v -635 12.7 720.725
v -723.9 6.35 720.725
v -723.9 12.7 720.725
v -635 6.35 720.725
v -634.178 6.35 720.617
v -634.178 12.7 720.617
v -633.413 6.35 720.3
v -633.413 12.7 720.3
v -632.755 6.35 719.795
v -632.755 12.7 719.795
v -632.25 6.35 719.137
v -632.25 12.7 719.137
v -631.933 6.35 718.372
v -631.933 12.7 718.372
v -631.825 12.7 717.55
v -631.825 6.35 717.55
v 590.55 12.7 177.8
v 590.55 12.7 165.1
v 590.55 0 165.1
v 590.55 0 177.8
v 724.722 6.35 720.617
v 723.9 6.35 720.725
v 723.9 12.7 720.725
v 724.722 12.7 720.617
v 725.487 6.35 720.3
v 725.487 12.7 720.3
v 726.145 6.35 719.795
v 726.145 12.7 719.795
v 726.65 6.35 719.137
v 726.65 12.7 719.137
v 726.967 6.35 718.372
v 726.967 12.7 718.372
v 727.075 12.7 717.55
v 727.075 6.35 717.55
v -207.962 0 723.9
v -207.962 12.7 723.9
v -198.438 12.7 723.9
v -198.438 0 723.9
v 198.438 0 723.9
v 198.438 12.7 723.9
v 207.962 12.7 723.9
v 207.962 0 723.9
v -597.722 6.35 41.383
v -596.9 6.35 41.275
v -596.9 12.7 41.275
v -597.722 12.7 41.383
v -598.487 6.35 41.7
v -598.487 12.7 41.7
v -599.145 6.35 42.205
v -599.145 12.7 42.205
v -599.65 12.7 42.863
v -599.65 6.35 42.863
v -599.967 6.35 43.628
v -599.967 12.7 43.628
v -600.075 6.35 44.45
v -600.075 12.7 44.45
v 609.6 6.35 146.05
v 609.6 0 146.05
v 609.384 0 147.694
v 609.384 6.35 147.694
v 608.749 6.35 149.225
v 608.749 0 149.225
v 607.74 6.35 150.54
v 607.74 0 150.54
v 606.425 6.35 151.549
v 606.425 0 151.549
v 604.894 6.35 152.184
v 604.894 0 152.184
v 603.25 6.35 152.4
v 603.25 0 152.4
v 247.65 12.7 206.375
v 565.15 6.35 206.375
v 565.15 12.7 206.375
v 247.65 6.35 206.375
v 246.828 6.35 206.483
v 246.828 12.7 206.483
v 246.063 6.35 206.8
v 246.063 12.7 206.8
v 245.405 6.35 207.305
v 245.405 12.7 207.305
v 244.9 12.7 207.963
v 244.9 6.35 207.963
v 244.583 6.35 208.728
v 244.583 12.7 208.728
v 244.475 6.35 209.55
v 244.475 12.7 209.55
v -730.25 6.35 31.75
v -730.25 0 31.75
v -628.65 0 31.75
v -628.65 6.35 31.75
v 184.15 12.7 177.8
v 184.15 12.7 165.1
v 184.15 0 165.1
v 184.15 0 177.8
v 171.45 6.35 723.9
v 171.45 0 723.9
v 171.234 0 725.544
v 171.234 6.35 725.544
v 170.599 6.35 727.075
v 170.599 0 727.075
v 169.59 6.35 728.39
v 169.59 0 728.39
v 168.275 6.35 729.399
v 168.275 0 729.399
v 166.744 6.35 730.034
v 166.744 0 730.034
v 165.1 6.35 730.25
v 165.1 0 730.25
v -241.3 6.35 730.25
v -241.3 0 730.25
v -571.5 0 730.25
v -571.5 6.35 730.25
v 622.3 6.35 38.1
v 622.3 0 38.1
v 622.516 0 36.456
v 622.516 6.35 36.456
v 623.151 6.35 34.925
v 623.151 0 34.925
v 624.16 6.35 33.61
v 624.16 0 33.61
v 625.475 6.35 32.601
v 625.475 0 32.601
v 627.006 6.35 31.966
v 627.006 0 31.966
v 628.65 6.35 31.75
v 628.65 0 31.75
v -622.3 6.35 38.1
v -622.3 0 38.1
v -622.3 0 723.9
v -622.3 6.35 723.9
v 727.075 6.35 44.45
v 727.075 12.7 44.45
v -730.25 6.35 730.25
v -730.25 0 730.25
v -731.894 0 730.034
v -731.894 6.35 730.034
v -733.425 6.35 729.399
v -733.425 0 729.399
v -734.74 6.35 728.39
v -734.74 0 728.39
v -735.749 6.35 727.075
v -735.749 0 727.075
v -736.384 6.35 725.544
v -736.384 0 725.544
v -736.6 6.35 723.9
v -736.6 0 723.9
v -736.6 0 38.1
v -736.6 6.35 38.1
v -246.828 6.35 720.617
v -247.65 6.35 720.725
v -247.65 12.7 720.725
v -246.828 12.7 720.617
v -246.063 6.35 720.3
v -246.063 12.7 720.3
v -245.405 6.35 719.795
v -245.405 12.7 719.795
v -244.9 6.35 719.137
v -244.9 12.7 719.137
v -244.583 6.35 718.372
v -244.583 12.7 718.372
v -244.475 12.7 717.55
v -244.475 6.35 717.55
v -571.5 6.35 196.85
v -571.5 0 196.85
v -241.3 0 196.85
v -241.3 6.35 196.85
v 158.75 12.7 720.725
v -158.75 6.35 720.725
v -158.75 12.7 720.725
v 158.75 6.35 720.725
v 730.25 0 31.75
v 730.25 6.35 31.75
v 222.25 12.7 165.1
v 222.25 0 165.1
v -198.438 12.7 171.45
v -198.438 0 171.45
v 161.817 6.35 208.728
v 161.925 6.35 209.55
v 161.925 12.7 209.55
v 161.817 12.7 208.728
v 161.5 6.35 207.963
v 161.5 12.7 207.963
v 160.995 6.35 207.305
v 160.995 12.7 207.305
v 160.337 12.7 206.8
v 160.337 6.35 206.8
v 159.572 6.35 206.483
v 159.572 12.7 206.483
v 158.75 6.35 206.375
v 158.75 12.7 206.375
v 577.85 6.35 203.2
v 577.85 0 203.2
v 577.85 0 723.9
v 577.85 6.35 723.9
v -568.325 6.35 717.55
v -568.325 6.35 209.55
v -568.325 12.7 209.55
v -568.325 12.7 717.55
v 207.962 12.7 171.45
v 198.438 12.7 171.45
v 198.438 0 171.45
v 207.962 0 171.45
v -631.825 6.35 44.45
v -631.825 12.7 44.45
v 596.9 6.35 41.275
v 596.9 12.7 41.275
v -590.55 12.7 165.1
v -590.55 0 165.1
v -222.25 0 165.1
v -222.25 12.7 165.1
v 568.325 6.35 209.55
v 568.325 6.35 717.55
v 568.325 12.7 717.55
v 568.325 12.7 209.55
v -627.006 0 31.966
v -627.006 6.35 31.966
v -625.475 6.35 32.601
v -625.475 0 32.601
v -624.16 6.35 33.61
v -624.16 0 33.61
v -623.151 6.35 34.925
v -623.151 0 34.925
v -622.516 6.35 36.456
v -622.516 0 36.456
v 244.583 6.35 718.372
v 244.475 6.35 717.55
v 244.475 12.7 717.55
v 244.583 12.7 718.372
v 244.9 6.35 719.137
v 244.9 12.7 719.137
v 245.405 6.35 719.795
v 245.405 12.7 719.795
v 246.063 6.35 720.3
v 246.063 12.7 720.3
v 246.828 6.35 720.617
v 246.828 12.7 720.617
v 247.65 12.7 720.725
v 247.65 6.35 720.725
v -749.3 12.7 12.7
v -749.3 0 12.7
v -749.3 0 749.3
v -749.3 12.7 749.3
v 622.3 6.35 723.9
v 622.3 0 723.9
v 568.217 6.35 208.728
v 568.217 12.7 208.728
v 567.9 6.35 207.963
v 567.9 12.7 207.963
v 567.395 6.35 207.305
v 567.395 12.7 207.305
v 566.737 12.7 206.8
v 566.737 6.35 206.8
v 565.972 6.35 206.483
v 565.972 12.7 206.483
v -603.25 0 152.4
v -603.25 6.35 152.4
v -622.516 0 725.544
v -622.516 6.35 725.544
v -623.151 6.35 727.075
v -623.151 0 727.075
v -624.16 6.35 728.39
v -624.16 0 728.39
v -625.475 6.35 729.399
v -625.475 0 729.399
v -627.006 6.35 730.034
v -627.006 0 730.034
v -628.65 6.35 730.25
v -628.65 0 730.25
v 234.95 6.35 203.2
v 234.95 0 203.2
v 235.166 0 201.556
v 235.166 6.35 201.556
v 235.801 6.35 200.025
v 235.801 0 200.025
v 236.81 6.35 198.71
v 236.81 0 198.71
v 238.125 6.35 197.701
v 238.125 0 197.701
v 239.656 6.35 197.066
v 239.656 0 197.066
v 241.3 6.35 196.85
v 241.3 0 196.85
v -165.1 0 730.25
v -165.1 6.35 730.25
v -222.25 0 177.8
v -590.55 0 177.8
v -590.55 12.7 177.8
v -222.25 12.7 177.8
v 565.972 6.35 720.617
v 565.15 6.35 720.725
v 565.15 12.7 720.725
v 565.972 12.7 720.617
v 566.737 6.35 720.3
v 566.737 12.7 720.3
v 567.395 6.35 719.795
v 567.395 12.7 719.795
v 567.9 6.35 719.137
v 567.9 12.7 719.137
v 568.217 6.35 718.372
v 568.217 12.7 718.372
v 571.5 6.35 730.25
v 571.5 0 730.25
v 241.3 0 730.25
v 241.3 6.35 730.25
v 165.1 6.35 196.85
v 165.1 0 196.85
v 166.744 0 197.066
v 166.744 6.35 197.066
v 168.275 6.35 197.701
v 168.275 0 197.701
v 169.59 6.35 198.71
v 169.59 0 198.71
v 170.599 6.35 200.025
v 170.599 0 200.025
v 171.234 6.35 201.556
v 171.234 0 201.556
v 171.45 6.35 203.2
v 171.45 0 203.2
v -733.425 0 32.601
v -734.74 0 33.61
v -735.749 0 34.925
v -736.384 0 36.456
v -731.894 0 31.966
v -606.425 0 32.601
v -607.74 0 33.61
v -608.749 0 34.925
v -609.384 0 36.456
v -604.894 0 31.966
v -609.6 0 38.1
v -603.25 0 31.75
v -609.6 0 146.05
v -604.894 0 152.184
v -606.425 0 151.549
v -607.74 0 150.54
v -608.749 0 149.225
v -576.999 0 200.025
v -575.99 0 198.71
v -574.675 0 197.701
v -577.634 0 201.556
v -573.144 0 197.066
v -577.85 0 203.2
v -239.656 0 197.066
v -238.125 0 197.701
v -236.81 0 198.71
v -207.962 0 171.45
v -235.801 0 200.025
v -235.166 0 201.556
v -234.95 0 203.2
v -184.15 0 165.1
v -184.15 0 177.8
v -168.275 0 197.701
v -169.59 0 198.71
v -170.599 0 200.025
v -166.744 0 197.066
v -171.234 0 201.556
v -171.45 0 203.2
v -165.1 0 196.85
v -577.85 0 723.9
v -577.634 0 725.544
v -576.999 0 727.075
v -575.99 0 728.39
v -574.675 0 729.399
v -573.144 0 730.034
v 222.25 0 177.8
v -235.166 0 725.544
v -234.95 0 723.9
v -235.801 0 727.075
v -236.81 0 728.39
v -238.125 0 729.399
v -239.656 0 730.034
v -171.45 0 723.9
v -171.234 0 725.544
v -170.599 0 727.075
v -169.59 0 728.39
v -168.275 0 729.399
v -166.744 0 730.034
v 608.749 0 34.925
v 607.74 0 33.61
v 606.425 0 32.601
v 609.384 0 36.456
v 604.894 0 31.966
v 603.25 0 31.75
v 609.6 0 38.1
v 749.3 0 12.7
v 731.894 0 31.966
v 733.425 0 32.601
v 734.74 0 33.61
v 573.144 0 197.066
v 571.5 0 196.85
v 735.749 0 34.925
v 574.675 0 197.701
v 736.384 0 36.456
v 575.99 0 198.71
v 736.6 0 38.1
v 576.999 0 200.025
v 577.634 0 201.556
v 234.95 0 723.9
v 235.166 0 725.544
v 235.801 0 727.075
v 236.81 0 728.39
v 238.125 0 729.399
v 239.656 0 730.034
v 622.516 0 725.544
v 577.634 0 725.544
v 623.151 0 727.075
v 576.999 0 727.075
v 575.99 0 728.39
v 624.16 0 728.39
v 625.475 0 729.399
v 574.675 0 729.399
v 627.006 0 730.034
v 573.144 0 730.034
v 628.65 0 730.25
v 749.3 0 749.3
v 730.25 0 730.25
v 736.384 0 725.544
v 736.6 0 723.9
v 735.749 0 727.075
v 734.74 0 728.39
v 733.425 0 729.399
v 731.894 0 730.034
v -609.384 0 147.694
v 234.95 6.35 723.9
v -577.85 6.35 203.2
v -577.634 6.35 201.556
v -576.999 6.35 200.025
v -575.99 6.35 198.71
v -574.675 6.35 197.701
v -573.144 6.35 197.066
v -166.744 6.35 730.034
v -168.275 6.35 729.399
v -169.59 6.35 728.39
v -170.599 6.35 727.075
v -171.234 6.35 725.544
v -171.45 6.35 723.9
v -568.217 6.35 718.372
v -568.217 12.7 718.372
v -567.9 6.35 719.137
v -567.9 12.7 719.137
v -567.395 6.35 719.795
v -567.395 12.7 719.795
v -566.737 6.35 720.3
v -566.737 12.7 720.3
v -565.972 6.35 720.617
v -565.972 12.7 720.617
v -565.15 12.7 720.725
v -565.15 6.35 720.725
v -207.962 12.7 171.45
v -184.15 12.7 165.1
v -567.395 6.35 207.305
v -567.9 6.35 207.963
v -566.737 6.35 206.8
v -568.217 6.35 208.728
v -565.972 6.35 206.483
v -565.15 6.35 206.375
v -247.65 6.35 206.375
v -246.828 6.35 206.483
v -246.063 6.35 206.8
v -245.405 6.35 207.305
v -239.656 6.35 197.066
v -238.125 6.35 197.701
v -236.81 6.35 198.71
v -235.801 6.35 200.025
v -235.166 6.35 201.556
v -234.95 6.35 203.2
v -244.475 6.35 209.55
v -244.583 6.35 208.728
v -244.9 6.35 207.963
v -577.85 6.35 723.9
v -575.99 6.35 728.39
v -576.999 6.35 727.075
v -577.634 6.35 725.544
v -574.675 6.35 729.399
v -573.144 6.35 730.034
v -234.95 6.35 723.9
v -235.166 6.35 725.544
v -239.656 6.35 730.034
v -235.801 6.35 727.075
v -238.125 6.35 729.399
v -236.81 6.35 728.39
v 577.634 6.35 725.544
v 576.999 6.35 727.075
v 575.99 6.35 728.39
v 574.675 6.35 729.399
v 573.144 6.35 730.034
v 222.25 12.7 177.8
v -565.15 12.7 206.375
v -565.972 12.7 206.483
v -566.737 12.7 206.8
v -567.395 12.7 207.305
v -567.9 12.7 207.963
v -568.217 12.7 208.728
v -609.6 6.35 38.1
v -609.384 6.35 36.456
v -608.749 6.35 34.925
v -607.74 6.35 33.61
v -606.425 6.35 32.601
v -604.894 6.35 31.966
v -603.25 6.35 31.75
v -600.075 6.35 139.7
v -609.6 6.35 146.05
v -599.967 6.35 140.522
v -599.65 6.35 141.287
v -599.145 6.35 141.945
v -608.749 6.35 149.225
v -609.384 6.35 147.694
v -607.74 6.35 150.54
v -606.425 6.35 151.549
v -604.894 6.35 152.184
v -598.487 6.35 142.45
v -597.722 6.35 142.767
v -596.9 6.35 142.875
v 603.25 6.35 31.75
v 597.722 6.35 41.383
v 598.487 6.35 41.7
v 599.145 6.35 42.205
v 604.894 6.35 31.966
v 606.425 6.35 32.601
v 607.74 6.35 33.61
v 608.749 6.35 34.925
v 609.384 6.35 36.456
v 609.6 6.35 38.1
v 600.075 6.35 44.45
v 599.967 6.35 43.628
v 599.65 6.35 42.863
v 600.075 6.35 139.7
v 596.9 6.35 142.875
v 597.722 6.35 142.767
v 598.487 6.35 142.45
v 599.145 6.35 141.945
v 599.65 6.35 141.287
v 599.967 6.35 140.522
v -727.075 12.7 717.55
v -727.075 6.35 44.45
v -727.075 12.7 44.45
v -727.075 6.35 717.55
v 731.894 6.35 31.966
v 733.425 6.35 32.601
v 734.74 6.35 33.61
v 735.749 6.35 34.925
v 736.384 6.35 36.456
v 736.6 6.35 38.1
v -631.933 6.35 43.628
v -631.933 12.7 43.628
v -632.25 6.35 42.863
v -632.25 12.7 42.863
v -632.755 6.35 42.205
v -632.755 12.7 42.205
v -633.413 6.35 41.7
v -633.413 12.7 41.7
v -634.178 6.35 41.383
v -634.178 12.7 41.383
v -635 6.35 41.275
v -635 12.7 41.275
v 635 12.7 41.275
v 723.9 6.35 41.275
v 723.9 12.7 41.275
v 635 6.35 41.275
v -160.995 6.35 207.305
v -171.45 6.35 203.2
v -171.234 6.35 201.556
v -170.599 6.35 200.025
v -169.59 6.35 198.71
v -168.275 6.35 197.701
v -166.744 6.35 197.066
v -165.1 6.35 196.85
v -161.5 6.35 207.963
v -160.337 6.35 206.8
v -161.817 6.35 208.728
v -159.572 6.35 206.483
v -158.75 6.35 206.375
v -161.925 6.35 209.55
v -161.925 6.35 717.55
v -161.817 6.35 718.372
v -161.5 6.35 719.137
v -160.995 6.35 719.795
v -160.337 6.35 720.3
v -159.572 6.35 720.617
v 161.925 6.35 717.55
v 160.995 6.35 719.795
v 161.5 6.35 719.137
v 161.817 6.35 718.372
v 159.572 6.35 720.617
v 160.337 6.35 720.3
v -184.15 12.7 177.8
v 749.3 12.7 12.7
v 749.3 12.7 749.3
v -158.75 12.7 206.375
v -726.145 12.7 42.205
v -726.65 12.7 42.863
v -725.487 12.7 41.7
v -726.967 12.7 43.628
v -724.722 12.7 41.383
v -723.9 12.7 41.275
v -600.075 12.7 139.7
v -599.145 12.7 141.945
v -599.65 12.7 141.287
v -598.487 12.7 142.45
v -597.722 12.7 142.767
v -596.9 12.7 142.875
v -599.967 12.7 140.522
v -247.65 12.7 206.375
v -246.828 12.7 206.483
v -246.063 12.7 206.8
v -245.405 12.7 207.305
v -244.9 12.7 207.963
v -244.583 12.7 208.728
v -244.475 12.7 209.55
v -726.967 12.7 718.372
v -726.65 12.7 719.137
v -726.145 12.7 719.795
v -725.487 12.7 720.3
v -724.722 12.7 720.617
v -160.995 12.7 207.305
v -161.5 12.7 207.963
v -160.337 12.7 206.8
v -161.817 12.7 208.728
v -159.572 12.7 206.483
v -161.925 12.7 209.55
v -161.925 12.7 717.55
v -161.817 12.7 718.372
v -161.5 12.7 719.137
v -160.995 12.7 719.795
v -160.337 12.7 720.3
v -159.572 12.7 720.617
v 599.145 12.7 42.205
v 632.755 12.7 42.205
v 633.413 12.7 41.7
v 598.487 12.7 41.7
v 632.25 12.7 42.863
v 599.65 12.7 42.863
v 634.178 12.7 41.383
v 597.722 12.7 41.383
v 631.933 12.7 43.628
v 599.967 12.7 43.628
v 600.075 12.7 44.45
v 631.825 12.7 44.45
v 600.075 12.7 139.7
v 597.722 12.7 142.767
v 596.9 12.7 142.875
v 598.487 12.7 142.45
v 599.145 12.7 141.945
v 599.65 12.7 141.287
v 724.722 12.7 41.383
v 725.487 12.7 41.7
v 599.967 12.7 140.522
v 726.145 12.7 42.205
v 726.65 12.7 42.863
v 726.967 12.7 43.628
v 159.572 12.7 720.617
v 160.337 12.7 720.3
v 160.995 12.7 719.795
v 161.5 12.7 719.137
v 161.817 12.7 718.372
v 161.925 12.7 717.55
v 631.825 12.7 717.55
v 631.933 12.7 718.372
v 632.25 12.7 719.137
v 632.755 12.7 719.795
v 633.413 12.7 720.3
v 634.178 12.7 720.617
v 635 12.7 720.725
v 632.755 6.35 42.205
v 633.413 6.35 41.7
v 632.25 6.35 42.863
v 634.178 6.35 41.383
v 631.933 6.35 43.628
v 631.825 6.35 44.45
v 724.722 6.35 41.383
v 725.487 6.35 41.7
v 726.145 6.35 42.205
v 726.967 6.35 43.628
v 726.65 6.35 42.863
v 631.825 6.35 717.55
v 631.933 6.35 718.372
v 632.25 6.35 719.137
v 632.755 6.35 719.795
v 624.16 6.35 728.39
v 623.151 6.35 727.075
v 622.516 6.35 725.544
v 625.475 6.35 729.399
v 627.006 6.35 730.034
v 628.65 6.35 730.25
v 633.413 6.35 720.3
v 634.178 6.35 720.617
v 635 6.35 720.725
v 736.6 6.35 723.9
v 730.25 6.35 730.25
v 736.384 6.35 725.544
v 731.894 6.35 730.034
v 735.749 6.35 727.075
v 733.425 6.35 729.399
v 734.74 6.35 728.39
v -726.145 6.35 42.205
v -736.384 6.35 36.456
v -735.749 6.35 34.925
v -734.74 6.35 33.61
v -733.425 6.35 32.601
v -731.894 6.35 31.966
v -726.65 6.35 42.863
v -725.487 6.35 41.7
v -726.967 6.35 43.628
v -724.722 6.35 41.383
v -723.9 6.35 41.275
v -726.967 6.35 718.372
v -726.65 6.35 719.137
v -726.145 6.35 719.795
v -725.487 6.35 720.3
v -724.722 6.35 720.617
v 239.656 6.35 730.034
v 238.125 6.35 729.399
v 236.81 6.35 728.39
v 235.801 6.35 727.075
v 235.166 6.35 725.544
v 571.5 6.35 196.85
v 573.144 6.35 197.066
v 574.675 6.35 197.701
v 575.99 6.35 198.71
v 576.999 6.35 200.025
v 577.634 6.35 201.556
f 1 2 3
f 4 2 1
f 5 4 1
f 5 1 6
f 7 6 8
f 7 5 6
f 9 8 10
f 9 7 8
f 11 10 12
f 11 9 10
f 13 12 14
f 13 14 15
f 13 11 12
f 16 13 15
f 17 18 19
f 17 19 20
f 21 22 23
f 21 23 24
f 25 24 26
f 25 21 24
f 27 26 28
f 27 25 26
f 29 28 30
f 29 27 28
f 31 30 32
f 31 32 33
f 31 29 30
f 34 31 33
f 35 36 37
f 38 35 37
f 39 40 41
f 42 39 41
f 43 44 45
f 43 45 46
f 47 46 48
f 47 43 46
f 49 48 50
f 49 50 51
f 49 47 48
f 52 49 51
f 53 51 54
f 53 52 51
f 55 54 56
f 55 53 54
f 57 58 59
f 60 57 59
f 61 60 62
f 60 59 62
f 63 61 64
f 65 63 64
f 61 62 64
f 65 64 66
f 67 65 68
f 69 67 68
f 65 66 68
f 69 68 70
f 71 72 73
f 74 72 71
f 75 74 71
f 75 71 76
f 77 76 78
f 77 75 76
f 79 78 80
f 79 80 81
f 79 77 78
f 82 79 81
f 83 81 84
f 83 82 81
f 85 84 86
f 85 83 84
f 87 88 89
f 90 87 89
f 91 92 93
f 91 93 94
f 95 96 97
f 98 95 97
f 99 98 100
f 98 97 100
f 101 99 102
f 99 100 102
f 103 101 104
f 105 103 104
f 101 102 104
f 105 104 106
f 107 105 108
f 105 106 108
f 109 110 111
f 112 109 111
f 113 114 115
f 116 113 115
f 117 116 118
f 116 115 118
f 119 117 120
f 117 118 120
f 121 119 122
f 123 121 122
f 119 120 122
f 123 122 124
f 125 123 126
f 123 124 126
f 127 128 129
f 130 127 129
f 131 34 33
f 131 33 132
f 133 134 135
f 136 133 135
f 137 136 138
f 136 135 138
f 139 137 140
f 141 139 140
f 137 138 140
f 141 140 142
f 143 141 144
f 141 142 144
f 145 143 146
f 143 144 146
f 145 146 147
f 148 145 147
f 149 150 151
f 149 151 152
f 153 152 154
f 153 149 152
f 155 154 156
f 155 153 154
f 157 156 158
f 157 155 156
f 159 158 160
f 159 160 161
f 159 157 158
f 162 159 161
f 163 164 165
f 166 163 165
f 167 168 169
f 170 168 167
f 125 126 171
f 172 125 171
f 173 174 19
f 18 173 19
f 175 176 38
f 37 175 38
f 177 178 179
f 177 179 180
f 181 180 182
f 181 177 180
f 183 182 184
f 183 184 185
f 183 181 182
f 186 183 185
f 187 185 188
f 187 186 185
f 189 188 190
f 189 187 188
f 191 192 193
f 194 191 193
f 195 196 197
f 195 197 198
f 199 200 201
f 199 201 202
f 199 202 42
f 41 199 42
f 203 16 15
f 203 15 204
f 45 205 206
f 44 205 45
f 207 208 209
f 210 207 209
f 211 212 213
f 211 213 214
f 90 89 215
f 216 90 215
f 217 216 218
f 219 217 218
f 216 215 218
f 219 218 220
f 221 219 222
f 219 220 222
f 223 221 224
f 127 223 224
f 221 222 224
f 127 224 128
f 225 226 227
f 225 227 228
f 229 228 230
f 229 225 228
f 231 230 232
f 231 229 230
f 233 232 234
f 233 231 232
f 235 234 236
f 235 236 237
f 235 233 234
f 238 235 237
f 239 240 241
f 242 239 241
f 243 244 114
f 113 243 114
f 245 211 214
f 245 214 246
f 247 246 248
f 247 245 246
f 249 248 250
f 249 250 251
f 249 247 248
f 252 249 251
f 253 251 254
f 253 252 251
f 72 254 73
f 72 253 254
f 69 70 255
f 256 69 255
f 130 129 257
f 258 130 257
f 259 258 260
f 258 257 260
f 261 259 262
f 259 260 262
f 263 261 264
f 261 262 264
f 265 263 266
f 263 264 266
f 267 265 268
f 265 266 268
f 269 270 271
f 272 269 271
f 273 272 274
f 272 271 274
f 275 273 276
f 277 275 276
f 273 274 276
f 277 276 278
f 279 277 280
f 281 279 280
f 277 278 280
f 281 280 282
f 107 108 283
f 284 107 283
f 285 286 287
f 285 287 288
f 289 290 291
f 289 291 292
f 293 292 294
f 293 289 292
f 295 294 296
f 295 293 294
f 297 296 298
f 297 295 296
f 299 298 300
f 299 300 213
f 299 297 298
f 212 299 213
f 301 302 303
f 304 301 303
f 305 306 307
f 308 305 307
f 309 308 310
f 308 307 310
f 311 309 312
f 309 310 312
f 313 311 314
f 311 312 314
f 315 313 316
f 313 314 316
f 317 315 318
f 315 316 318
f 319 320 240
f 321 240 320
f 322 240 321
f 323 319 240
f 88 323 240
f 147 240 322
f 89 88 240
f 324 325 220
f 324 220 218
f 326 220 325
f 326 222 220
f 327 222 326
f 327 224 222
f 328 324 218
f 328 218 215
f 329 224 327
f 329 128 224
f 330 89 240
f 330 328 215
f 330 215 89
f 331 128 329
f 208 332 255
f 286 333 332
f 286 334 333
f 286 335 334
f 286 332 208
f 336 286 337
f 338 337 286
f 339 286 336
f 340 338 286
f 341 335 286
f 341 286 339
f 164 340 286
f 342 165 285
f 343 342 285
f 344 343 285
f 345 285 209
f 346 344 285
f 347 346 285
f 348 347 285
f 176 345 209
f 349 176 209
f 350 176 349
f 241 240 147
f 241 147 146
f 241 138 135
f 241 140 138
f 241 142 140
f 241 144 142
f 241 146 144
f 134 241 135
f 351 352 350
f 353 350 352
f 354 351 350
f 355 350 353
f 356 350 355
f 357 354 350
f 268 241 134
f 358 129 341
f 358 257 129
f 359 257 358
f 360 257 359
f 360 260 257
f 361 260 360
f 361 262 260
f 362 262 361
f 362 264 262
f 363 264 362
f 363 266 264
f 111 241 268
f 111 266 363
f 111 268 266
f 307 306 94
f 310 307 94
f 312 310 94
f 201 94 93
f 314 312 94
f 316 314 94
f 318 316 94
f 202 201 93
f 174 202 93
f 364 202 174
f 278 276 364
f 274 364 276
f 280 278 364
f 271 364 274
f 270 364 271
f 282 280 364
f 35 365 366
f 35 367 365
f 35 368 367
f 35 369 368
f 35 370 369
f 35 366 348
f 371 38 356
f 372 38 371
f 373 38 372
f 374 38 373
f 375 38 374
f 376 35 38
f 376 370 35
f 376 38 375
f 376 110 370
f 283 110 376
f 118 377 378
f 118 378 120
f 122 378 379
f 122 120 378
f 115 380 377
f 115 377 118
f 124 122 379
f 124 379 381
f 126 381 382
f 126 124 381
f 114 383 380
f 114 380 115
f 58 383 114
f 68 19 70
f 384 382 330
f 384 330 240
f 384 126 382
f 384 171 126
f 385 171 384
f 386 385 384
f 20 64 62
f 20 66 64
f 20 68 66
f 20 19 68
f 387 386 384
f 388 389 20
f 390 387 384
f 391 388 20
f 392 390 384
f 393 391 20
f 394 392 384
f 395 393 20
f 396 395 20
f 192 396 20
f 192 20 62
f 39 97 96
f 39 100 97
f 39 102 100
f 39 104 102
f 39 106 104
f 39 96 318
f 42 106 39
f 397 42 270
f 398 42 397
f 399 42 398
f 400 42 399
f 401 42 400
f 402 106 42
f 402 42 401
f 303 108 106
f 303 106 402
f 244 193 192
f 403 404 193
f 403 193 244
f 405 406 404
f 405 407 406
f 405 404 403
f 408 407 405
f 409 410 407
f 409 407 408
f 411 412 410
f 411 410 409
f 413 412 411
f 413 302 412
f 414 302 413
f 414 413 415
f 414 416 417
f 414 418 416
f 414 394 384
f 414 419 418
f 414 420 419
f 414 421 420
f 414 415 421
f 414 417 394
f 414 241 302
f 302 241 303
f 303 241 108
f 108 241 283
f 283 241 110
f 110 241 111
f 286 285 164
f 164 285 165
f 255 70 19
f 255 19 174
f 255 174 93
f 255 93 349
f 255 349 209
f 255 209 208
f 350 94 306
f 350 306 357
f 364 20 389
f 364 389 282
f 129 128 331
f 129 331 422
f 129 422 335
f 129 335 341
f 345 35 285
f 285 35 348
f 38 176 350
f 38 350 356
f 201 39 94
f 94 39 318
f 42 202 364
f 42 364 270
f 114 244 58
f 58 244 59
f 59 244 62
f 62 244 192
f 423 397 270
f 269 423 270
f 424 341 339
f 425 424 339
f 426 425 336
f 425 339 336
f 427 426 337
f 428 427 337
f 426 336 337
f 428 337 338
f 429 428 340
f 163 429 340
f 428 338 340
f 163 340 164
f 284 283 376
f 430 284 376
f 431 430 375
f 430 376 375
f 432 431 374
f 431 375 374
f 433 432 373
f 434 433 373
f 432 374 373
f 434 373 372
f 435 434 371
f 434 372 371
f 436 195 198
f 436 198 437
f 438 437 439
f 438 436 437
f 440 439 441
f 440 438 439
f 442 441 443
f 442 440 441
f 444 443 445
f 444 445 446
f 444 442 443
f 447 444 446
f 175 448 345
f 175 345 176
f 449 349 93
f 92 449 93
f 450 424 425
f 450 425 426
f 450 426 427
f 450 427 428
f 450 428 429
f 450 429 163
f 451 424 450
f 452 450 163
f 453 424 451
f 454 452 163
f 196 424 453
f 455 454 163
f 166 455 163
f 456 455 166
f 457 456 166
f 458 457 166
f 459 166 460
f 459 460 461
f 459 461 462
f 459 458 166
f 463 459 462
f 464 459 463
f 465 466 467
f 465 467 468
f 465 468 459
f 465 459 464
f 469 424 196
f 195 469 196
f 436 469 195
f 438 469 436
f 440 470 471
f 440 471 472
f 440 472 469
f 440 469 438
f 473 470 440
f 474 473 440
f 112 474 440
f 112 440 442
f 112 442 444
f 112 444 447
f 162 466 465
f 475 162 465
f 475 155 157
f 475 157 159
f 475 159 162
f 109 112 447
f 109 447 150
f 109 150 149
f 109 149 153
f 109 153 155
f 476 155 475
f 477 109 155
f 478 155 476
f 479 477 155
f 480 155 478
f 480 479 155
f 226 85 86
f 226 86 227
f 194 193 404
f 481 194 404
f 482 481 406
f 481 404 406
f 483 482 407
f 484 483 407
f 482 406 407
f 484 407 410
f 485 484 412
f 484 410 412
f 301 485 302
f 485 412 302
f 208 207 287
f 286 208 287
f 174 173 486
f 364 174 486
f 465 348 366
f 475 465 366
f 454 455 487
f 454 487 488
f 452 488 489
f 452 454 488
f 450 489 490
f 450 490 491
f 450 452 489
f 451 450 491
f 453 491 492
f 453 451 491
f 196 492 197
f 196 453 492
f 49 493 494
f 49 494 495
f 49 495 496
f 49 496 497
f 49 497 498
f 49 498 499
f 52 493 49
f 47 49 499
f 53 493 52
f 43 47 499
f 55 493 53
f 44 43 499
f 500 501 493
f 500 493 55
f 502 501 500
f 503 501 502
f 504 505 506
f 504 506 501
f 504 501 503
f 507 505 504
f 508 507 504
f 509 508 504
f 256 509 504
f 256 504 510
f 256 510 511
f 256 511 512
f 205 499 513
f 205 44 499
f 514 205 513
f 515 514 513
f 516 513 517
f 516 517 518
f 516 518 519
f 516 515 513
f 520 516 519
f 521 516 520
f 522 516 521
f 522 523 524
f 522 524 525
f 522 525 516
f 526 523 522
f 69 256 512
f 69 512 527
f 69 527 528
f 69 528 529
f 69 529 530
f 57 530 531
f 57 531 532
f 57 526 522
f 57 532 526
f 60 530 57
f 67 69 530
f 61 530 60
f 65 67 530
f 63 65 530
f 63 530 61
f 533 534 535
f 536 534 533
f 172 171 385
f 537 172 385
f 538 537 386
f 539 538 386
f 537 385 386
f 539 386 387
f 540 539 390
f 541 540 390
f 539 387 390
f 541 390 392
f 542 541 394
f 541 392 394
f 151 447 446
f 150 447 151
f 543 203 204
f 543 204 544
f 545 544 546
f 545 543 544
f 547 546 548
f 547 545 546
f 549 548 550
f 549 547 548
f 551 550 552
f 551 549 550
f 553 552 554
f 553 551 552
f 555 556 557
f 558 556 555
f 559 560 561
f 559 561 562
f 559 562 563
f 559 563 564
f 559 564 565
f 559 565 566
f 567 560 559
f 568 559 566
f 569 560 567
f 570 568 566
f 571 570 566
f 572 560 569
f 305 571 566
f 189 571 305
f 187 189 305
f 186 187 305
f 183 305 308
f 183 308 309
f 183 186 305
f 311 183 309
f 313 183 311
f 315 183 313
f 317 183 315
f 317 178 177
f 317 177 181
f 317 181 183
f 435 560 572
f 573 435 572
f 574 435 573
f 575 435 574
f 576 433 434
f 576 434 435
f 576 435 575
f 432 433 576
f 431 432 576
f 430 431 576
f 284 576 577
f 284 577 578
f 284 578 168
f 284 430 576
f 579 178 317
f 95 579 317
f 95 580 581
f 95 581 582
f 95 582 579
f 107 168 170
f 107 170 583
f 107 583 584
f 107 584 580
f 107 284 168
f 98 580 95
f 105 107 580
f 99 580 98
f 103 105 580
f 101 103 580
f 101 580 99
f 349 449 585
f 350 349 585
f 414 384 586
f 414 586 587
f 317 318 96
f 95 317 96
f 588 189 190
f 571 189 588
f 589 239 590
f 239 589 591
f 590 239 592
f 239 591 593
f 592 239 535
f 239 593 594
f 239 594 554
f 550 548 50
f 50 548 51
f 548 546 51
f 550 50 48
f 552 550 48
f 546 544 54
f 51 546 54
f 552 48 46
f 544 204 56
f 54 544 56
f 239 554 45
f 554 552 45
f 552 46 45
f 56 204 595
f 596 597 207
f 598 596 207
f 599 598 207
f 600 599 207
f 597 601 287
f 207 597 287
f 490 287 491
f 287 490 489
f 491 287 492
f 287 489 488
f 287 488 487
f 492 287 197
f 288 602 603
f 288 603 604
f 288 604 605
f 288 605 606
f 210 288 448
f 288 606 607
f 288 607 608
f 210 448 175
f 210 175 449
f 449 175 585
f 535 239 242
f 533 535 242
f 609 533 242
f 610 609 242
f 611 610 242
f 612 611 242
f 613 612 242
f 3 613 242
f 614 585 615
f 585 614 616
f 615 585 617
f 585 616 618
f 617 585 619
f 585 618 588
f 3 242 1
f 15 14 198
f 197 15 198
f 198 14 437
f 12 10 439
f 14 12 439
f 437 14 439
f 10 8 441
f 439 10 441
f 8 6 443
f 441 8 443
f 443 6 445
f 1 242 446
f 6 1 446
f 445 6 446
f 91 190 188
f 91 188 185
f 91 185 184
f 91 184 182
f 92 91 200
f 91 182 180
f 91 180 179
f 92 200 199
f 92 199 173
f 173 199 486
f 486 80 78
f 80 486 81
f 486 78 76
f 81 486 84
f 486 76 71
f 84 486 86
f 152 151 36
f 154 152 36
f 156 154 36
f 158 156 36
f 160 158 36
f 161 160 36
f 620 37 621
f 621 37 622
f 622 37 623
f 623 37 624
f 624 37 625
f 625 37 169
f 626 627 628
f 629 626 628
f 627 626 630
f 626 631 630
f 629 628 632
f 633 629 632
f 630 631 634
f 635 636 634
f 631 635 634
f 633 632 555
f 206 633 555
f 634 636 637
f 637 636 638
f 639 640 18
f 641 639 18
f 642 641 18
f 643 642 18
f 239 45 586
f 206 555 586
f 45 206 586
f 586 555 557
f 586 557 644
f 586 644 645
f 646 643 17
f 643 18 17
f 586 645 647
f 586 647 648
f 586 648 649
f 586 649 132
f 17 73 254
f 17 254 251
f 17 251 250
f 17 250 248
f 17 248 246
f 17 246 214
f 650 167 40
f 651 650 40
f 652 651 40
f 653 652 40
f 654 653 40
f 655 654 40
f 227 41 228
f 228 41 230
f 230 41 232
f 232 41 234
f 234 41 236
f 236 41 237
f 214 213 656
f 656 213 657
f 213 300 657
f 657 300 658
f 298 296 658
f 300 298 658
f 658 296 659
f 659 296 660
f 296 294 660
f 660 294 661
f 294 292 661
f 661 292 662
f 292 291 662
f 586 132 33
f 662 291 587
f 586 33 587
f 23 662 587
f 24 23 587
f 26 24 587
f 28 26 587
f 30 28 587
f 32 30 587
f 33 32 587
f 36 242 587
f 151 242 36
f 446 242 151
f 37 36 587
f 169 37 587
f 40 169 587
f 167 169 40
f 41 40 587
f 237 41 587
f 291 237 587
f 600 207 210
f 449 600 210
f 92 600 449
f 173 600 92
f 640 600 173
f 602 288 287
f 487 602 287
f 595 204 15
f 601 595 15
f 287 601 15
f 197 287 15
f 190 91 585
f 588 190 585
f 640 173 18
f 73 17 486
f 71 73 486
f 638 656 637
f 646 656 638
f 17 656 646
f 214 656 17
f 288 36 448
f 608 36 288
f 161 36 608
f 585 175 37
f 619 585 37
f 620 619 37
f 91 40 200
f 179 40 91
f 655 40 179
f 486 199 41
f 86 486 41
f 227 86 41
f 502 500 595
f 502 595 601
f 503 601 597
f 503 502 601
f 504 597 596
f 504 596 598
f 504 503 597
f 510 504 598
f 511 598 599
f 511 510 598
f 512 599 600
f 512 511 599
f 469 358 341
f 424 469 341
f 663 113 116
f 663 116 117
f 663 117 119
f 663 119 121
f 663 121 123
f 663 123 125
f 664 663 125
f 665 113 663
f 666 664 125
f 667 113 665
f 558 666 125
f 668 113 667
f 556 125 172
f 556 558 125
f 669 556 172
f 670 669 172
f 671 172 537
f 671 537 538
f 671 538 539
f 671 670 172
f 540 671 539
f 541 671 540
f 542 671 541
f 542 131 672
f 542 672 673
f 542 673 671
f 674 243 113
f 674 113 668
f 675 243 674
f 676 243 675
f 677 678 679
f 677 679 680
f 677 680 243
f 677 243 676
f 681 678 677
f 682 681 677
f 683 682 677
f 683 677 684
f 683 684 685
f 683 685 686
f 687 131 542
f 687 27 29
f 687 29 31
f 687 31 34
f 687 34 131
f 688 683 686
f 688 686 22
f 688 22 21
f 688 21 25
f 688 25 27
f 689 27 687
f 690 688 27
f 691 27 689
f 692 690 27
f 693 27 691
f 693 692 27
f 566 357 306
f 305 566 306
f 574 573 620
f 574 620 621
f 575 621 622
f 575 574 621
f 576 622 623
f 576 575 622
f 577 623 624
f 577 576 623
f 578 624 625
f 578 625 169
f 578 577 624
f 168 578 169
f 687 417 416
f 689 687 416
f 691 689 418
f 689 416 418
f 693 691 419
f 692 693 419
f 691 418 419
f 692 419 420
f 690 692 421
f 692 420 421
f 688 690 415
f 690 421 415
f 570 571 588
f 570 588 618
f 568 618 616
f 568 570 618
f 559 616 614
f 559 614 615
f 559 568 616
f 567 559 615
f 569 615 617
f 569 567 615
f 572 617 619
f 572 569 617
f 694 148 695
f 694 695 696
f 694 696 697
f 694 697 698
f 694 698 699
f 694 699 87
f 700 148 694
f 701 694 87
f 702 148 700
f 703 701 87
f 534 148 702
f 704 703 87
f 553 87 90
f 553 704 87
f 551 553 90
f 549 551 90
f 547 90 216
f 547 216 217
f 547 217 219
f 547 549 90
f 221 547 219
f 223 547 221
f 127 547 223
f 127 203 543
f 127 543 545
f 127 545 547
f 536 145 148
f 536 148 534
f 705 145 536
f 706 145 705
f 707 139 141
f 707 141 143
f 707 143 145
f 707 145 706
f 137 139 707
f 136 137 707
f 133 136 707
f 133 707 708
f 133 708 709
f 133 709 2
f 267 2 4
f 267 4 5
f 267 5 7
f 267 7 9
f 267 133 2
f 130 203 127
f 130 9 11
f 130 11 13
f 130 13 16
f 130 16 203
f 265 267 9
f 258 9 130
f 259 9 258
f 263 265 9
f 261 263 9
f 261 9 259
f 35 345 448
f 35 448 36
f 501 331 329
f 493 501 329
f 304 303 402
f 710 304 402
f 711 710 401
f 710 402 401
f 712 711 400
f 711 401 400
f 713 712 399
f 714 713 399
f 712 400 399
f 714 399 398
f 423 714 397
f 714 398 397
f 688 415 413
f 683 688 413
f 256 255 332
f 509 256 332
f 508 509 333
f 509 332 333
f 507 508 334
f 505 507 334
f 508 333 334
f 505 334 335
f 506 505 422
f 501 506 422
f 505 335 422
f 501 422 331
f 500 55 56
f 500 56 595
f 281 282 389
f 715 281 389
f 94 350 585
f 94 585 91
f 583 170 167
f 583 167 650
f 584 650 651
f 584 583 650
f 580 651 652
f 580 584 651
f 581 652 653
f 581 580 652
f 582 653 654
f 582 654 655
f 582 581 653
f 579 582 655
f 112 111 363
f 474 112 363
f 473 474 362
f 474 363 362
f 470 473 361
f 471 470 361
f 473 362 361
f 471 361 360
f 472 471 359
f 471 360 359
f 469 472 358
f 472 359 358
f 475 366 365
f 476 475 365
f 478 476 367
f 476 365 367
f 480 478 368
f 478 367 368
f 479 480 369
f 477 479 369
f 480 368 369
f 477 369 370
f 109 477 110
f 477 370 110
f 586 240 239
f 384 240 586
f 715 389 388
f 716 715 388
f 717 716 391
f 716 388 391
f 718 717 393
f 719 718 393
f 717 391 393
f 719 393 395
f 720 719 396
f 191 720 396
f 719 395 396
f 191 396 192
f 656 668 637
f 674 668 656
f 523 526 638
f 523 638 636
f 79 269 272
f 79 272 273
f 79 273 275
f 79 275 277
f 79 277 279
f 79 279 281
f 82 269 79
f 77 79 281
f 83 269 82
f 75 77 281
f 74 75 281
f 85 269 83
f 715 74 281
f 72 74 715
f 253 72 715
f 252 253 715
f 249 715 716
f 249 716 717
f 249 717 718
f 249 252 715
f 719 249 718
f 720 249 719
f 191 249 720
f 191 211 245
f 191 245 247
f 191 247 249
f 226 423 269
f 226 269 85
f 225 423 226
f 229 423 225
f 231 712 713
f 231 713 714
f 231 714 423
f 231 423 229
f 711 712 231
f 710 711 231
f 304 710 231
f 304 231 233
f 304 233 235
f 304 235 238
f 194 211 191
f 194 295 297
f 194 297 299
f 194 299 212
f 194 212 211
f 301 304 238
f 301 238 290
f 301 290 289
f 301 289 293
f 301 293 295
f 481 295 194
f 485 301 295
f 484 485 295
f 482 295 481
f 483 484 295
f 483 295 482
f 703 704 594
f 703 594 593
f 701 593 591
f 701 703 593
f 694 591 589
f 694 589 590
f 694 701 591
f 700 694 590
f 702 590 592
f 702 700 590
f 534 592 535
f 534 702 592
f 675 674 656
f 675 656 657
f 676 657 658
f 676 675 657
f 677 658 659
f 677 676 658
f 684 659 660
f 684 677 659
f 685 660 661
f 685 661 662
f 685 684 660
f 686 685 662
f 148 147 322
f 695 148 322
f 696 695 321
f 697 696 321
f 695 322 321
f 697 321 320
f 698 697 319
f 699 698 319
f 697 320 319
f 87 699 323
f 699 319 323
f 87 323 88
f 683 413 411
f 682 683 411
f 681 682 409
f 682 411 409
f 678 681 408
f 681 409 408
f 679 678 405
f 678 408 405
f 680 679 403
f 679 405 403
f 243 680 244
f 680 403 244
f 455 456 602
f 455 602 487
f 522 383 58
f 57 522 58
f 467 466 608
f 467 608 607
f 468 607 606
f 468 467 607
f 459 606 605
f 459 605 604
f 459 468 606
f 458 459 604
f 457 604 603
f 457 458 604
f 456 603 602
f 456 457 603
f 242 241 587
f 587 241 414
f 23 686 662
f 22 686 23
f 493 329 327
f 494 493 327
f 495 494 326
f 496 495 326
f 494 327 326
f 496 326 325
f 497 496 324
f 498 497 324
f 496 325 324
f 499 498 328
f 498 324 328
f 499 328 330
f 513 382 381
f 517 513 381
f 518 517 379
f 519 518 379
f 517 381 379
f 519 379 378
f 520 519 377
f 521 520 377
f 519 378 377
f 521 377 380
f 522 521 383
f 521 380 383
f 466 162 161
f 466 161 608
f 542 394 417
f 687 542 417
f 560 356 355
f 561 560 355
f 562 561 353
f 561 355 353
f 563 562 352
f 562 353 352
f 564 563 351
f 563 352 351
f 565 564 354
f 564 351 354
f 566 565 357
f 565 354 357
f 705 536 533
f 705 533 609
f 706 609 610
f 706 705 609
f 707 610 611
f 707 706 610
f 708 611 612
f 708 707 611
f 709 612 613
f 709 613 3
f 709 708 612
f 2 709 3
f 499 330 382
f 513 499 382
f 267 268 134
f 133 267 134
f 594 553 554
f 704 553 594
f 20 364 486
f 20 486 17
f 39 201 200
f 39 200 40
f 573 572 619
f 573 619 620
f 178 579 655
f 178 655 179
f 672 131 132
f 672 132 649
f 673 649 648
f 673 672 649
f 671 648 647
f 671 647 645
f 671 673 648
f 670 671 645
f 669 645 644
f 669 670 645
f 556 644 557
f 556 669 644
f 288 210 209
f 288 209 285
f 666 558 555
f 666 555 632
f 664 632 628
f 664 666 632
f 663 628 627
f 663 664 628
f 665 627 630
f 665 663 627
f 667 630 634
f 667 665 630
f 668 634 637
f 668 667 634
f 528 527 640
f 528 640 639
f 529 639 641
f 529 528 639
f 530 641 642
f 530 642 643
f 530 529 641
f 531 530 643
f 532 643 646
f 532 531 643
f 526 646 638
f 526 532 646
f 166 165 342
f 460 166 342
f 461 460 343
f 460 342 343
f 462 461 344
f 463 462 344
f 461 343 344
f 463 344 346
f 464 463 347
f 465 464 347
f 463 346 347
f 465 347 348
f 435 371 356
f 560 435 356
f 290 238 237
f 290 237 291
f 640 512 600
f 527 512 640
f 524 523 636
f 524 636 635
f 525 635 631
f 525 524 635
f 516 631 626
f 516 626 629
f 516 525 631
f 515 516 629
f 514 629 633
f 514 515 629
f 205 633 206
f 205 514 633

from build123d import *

# Parameters (mm, degrees)
F0_W     = 1498.6
F0_H     = 736.6
F0_W_2   = 368.3
F0_H_2   = 12.7
F0_W_3   = 9.525
F0_H_3   = 552.45
F1_DEPTH = 12.7
F2_DEPTH = 6.35


with BuildPart() as f1:
    # F0 (on Front) → F1 (new body)
    with BuildSketch(Plane.XZ):
        with Locations((0, 381)):
            Rectangle(F0_W, F0_H)
        with Locations((-406.4, 171.45)):
            Rectangle(F0_W_2, F0_H_2, mode=Mode.SUBTRACT)
        with BuildLine():
            Line((-609.6, 38.1), (-609.6, 146.05))
            ThreePointArc((-609.6, 146.05), (-607.740128, 150.540128), (-603.25, 152.4))
            Line((-603.25, 152.4), (603.25, 152.4))
            ThreePointArc((603.25, 152.4), (607.740128, 150.540128), (609.6, 146.05))
            Line((609.6, 146.05), (609.6, 38.1))
            ThreePointArc((609.6, 38.1), (607.740128, 33.609872), (603.25, 31.75))
            Line((603.25, 31.75), (-603.25, 31.75))
            ThreePointArc((-603.25, 31.75), (-607.740128, 33.609872), (-609.6, 38.1))
        make_face(mode=Mode.SUBTRACT)
        with Locations((0, 171.45)):
            Rectangle(F0_W_2, F0_H_2, mode=Mode.SUBTRACT)
        with Locations((406.4, 171.45)):
            Rectangle(F0_W_2, F0_H_2, mode=Mode.SUBTRACT)
        with BuildLine():
            ThreePointArc((-628.65, 730.25), (-624.159872, 728.390128), (-622.3, 723.9))
            Line((-622.3, 723.9), (-622.3, 38.1))
            ThreePointArc((-622.3, 38.1), (-624.159872, 33.609872), (-628.65, 31.75))
            Line((-628.65, 31.75), (-730.25, 31.75))
            ThreePointArc((-730.25, 31.75), (-734.740128, 33.609872), (-736.6, 38.1))
            Line((-736.6, 38.1), (-736.6, 723.9))
            ThreePointArc((-736.6, 723.9), (-734.740128, 728.390128), (-730.25, 730.25))
            Line((-730.25, 730.25), (-628.65, 730.25))
        make_face(mode=Mode.SUBTRACT)
        with BuildLine():
            Line((-577.85, 203.2), (-577.85, 723.9))
            ThreePointArc((-577.85, 723.9), (-575.990128, 728.390128), (-571.5, 730.25))
            Line((-571.5, 730.25), (-241.3, 730.25))
            ThreePointArc((-241.3, 730.25), (-236.809872, 728.390128), (-234.95, 723.9))
            Line((-234.95, 723.9), (-234.95, 203.2))
            ThreePointArc((-234.95, 203.2), (-236.809872, 198.709872), (-241.3, 196.85))
            Line((-241.3, 196.85), (-571.5, 196.85))
            ThreePointArc((-571.5, 196.85), (-575.990128, 198.709872), (-577.85, 203.2))
        make_face(mode=Mode.SUBTRACT)
        with Locations((-203.2, 447.675)):
            Rectangle(F0_W_3, F0_H_3, mode=Mode.SUBTRACT)
        with BuildLine():
            Line((-171.45, 203.2), (-171.45, 723.9))
            ThreePointArc((-171.45, 723.9), (-169.590128, 728.390128), (-165.1, 730.25))
            Line((-165.1, 730.25), (165.1, 730.25))
            ThreePointArc((165.1, 730.25), (169.590128, 728.390128), (171.45, 723.9))
            Line((171.45, 723.9), (171.45, 203.2))
            ThreePointArc((171.45, 203.2), (169.590128, 198.709872), (165.1, 196.85))
            Line((165.1, 196.85), (-165.1, 196.85))
            ThreePointArc((-165.1, 196.85), (-169.590128, 198.709872), (-171.45, 203.2))
        make_face(mode=Mode.SUBTRACT)
        with Locations((203.2, 447.675)):
            Rectangle(F0_W_3, F0_H_3, mode=Mode.SUBTRACT)
        with BuildLine():
            Line((234.95, 203.2), (234.95, 723.9))
            ThreePointArc((234.95, 723.9), (236.809872, 728.390128), (241.3, 730.25))
            Line((241.3, 730.25), (571.5, 730.25))
            ThreePointArc((571.5, 730.25), (575.990128, 728.390128), (577.85, 723.9))
            Line((577.85, 723.9), (577.85, 203.2))
            ThreePointArc((577.85, 203.2), (575.990128, 198.709872), (571.5, 196.85))
            Line((571.5, 196.85), (241.3, 196.85))
            ThreePointArc((241.3, 196.85), (236.809872, 198.709872), (234.95, 203.2))
        make_face(mode=Mode.SUBTRACT)
        with BuildLine():
            Line((622.3, 38.1), (622.3, 723.9))
            ThreePointArc((622.3, 723.9), (624.159872, 728.390128), (628.65, 730.25))
            Line((628.65, 730.25), (730.25, 730.25))
            ThreePointArc((730.25, 730.25), (734.740128, 728.390128), (736.6, 723.9))
            Line((736.6, 723.9), (736.6, 38.1))
            ThreePointArc((736.6, 38.1), (734.740128, 33.609872), (730.25, 31.75))
            Line((730.25, 31.75), (628.65, 31.75))
            ThreePointArc((628.65, 31.75), (624.159872, 33.609872), (622.3, 38.1))
        make_face(mode=Mode.SUBTRACT)
        with BuildLine():
            Line((-622.3, 38.1), (-622.3, 723.9))
            ThreePointArc((-622.3, 723.9), (-624.159872, 728.390128), (-628.65, 730.25))
            Line((-628.65, 730.25), (-730.25, 730.25))
            ThreePointArc((-730.25, 730.25), (-734.740128, 728.390128), (-736.6, 723.9))
            Line((-736.6, 723.9), (-736.6, 38.1))
            ThreePointArc((-736.6, 38.1), (-734.740128, 33.609872), (-730.25, 31.75))
            Line((-730.25, 31.75), (-628.65, 31.75))
            ThreePointArc((-628.65, 31.75), (-624.159872, 33.609872), (-622.3, 38.1))
        make_face()
        with BuildLine():
            ThreePointArc((-635, 720.725), (-632.754936, 719.795064), (-631.825, 717.55))
            Line((-631.825, 717.55), (-631.825, 44.45))
            ThreePointArc((-631.825, 44.45), (-632.754936, 42.204936), (-635, 41.275))
            Line((-635, 41.275), (-723.9, 41.275))
            ThreePointArc((-723.9, 41.275), (-726.145064, 42.204936), (-727.075, 44.45))
            Line((-727.075, 44.45), (-727.075, 717.55))
            ThreePointArc((-727.075, 717.55), (-726.145064, 719.795064), (-723.9, 720.725))
            Line((-723.9, 720.725), (-635, 720.725))
        make_face(mode=Mode.SUBTRACT)
        with BuildLine():
            ThreePointArc((-571.5, 730.25), (-575.990128, 728.390128), (-577.85, 723.9))
            Line((-577.85, 723.9), (-577.85, 203.2))
            ThreePointArc((-577.85, 203.2), (-575.990128, 198.709872), (-571.5, 196.85))
            Line((-571.5, 196.85), (-241.3, 196.85))
            ThreePointArc((-241.3, 196.85), (-236.809872, 198.709872), (-234.95, 203.2))
            Line((-234.95, 203.2), (-234.95, 723.9))
            ThreePointArc((-234.95, 723.9), (-236.809872, 728.390128), (-241.3, 730.25))
            Line((-241.3, 730.25), (-571.5, 730.25))
        make_face()
        with BuildLine():
            Line((-568.325, 209.55), (-568.325, 717.55))
            ThreePointArc((-568.325, 717.55), (-567.395064, 719.795064), (-565.15, 720.725))
            Line((-565.15, 720.725), (-247.65, 720.725))
            ThreePointArc((-247.65, 720.725), (-245.404936, 719.795064), (-244.475, 717.55))
            Line((-244.475, 717.55), (-244.475, 209.55))
            ThreePointArc((-244.475, 209.55), (-245.404936, 207.304936), (-247.65, 206.375))
            Line((-247.65, 206.375), (-565.15, 206.375))
            ThreePointArc((-565.15, 206.375), (-567.395064, 207.304936), (-568.325, 209.55))
        make_face(mode=Mode.SUBTRACT)
        with BuildLine():
            ThreePointArc((-165.1, 730.25), (-169.590128, 728.390128), (-171.45, 723.9))
            Line((-171.45, 723.9), (-171.45, 203.2))
            ThreePointArc((-171.45, 203.2), (-169.590128, 198.709872), (-165.1, 196.85))
            Line((-165.1, 196.85), (165.1, 196.85))
            ThreePointArc((165.1, 196.85), (169.590128, 198.709872), (171.45, 203.2))
            Line((171.45, 203.2), (171.45, 723.9))
            ThreePointArc((171.45, 723.9), (169.590128, 728.390128), (165.1, 730.25))
            Line((165.1, 730.25), (-165.1, 730.25))
        make_face()
        with BuildLine():
            ThreePointArc((-161.925, 717.55), (-160.995064, 719.795064), (-158.75, 720.725))
            Line((-158.75, 720.725), (158.75, 720.725))
            ThreePointArc((158.75, 720.725), (160.995064, 719.795064), (161.925, 717.55))
            Line((161.925, 717.55), (161.925, 209.55))
            ThreePointArc((161.925, 209.55), (160.995064, 207.304936), (158.75, 206.375))
            Line((158.75, 206.375), (-158.75, 206.375))
            ThreePointArc((-158.75, 206.375), (-160.995064, 207.304936), (-161.925, 209.55))
            Line((-161.925, 209.55), (-161.925, 717.55))
        make_face(mode=Mode.SUBTRACT)
        with BuildLine():
            ThreePointArc((241.3, 730.25), (236.809872, 728.390128), (234.95, 723.9))
            Line((234.95, 723.9), (234.95, 203.2))
            ThreePointArc((234.95, 203.2), (236.809872, 198.709872), (241.3, 196.85))
            Line((241.3, 196.85), (571.5, 196.85))
            ThreePointArc((571.5, 196.85), (575.990128, 198.709872), (577.85, 203.2))
            Line((577.85, 203.2), (577.85, 723.9))
            ThreePointArc((577.85, 723.9), (575.990128, 728.390128), (571.5, 730.25))
            Line((571.5, 730.25), (241.3, 730.25))
        make_face()
        with BuildLine():
            Line((244.475, 209.55), (244.475, 717.55))
            ThreePointArc((244.475, 717.55), (245.404936, 719.795064), (247.65, 720.725))
            Line((247.65, 720.725), (565.15, 720.725))
            ThreePointArc((565.15, 720.725), (567.395064, 719.795064), (568.325, 717.55))
            Line((568.325, 717.55), (568.325, 209.55))
            ThreePointArc((568.325, 209.55), (567.395064, 207.304936), (565.15, 206.375))
            Line((565.15, 206.375), (247.65, 206.375))
            ThreePointArc((247.65, 206.375), (245.404936, 207.304936), (244.475, 209.55))
        make_face(mode=Mode.SUBTRACT)
        with BuildLine():
            ThreePointArc((628.65, 730.25), (624.159872, 728.390128), (622.3, 723.9))
            Line((622.3, 723.9), (622.3, 38.1))
            ThreePointArc((622.3, 38.1), (624.159872, 33.609872), (628.65, 31.75))
            Line((628.65, 31.75), (730.25, 31.75))
            ThreePointArc((730.25, 31.75), (734.740128, 33.609872), (736.6, 38.1))
            Line((736.6, 38.1), (736.6, 723.9))
            ThreePointArc((736.6, 723.9), (734.740128, 728.390128), (730.25, 730.25))
            Line((730.25, 730.25), (628.65, 730.25))
        make_face()
        with BuildLine():
            ThreePointArc((635, 41.275), (632.754936, 42.204936), (631.825, 44.45))
            Line((631.825, 44.45), (631.825, 717.55))
            ThreePointArc((631.825, 717.55), (632.754936, 719.795064), (635, 720.725))
            Line((635, 720.725), (723.9, 720.725))
            ThreePointArc((723.9, 720.725), (726.145064, 719.795064), (727.075, 717.55))
            Line((727.075, 717.55), (727.075, 44.45))
            ThreePointArc((727.075, 44.45), (726.145064, 42.204936), (723.9, 41.275))
            Line((723.9, 41.275), (635, 41.275))
        make_face(mode=Mode.SUBTRACT)
        with BuildLine():
            ThreePointArc((-603.25, 152.4), (-607.740128, 150.540128), (-609.6, 146.05))
            Line((-609.6, 146.05), (-609.6, 38.1))
            ThreePointArc((-609.6, 38.1), (-607.740128, 33.609872), (-603.25, 31.75))
            Line((-603.25, 31.75), (603.25, 31.75))
            ThreePointArc((603.25, 31.75), (607.740128, 33.609872), (609.6, 38.1))
            Line((609.6, 38.1), (609.6, 146.05))
            ThreePointArc((609.6, 146.05), (607.740128, 150.540128), (603.25, 152.4))
            Line((603.25, 152.4), (-603.25, 152.4))
        make_face()
        with BuildLine():
            Line((-600.075, 44.45), (-600.075, 139.7))
            ThreePointArc((-600.075, 139.7), (-599.145064, 141.945064), (-596.9, 142.875))
            Line((-596.9, 142.875), (596.9, 142.875))
            ThreePointArc((596.9, 142.875), (599.145064, 141.945064), (600.075, 139.7))
            Line((600.075, 139.7), (600.075, 44.45))
            ThreePointArc((600.075, 44.45), (599.145064, 42.204936), (596.9, 41.275))
            Line((596.9, 41.275), (-596.9, 41.275))
            ThreePointArc((-596.9, 41.275), (-599.145064, 42.204936), (-600.075, 44.45))
        make_face(mode=Mode.SUBTRACT)
    extrude(amount=-F1_DEPTH)

    # F0 (on Front) → F2 (cut)
    with BuildSketch(Plane.XZ):
        with BuildLine():
            Line((-622.3, 38.1), (-622.3, 723.9))
            ThreePointArc((-622.3, 723.9), (-624.159872, 728.390128), (-628.65, 730.25))
            Line((-628.65, 730.25), (-730.25, 730.25))
            ThreePointArc((-730.25, 730.25), (-734.740128, 728.390128), (-736.6, 723.9))
            Line((-736.6, 723.9), (-736.6, 38.1))
            ThreePointArc((-736.6, 38.1), (-734.740128, 33.609872), (-730.25, 31.75))
            Line((-730.25, 31.75), (-628.65, 31.75))
            ThreePointArc((-628.65, 31.75), (-624.159872, 33.609872), (-622.3, 38.1))
        make_face()
        with BuildLine():
            ThreePointArc((-635, 720.725), (-632.754936, 719.795064), (-631.825, 717.55))
            Line((-631.825, 717.55), (-631.825, 44.45))
            ThreePointArc((-631.825, 44.45), (-632.754936, 42.204936), (-635, 41.275))
            Line((-635, 41.275), (-723.9, 41.275))
            ThreePointArc((-723.9, 41.275), (-726.145064, 42.204936), (-727.075, 44.45))
            Line((-727.075, 44.45), (-727.075, 717.55))
            ThreePointArc((-727.075, 717.55), (-726.145064, 719.795064), (-723.9, 720.725))
            Line((-723.9, 720.725), (-635, 720.725))
        make_face(mode=Mode.SUBTRACT)
        with BuildLine():
            ThreePointArc((-571.5, 730.25), (-575.990128, 728.390128), (-577.85, 723.9))
            Line((-577.85, 723.9), (-577.85, 203.2))
            ThreePointArc((-577.85, 203.2), (-575.990128, 198.709872), (-571.5, 196.85))
            Line((-571.5, 196.85), (-241.3, 196.85))
            ThreePointArc((-241.3, 196.85), (-236.809872, 198.709872), (-234.95, 203.2))
            Line((-234.95, 203.2), (-234.95, 723.9))
            ThreePointArc((-234.95, 723.9), (-236.809872, 728.390128), (-241.3, 730.25))
            Line((-241.3, 730.25), (-571.5, 730.25))
        make_face()
        with BuildLine():
            Line((-568.325, 209.55), (-568.325, 717.55))
            ThreePointArc((-568.325, 717.55), (-567.395064, 719.795064), (-565.15, 720.725))
            Line((-565.15, 720.725), (-247.65, 720.725))
            ThreePointArc((-247.65, 720.725), (-245.404936, 719.795064), (-244.475, 717.55))
            Line((-244.475, 717.55), (-244.475, 209.55))
            ThreePointArc((-244.475, 209.55), (-245.404936, 207.304936), (-247.65, 206.375))
            Line((-247.65, 206.375), (-565.15, 206.375))
            ThreePointArc((-565.15, 206.375), (-567.395064, 207.304936), (-568.325, 209.55))
        make_face(mode=Mode.SUBTRACT)
        with BuildLine():
            ThreePointArc((-165.1, 730.25), (-169.590128, 728.390128), (-171.45, 723.9))
            Line((-171.45, 723.9), (-171.45, 203.2))
            ThreePointArc((-171.45, 203.2), (-169.590128, 198.709872), (-165.1, 196.85))
            Line((-165.1, 196.85), (165.1, 196.85))
            ThreePointArc((165.1, 196.85), (169.590128, 198.709872), (171.45, 203.2))
            Line((171.45, 203.2), (171.45, 723.9))
            ThreePointArc((171.45, 723.9), (169.590128, 728.390128), (165.1, 730.25))
            Line((165.1, 730.25), (-165.1, 730.25))
        make_face()
        with BuildLine():
            ThreePointArc((-161.925, 717.55), (-160.995064, 719.795064), (-158.75, 720.725))
            Line((-158.75, 720.725), (158.75, 720.725))
            ThreePointArc((158.75, 720.725), (160.995064, 719.795064), (161.925, 717.55))
            Line((161.925, 717.55), (161.925, 209.55))
            ThreePointArc((161.925, 209.55), (160.995064, 207.304936), (158.75, 206.375))
            Line((158.75, 206.375), (-158.75, 206.375))
            ThreePointArc((-158.75, 206.375), (-160.995064, 207.304936), (-161.925, 209.55))
            Line((-161.925, 209.55), (-161.925, 717.55))
        make_face(mode=Mode.SUBTRACT)
        with BuildLine():
            ThreePointArc((241.3, 730.25), (236.809872, 728.390128), (234.95, 723.9))
            Line((234.95, 723.9), (234.95, 203.2))
            ThreePointArc((234.95, 203.2), (236.809872, 198.709872), (241.3, 196.85))
            Line((241.3, 196.85), (571.5, 196.85))
            ThreePointArc((571.5, 196.85), (575.990128, 198.709872), (577.85, 203.2))
            Line((577.85, 203.2), (577.85, 723.9))
            ThreePointArc((577.85, 723.9), (575.990128, 728.390128), (571.5, 730.25))
            Line((571.5, 730.25), (241.3, 730.25))
        make_face()
        with BuildLine():
            Line((244.475, 209.55), (244.475, 717.55))
            ThreePointArc((244.475, 717.55), (245.404936, 719.795064), (247.65, 720.725))
            Line((247.65, 720.725), (565.15, 720.725))
            ThreePointArc((565.15, 720.725), (567.395064, 719.795064), (568.325, 717.55))
            Line((568.325, 717.55), (568.325, 209.55))
            ThreePointArc((568.325, 209.55), (567.395064, 207.304936), (565.15, 206.375))
            Line((565.15, 206.375), (247.65, 206.375))
            ThreePointArc((247.65, 206.375), (245.404936, 207.304936), (244.475, 209.55))
        make_face(mode=Mode.SUBTRACT)
        with BuildLine():
            ThreePointArc((628.65, 730.25), (624.159872, 728.390128), (622.3, 723.9))
            Line((622.3, 723.9), (622.3, 38.1))
            ThreePointArc((622.3, 38.1), (624.159872, 33.609872), (628.65, 31.75))
            Line((628.65, 31.75), (730.25, 31.75))
            ThreePointArc((730.25, 31.75), (734.740128, 33.609872), (736.6, 38.1))
            Line((736.6, 38.1), (736.6, 723.9))
            ThreePointArc((736.6, 723.9), (734.740128, 728.390128), (730.25, 730.25))
            Line((730.25, 730.25), (628.65, 730.25))
        make_face()
        with BuildLine():
            ThreePointArc((635, 41.275), (632.754936, 42.204936), (631.825, 44.45))
            Line((631.825, 44.45), (631.825, 717.55))
            ThreePointArc((631.825, 717.55), (632.754936, 719.795064), (635, 720.725))
            Line((635, 720.725), (723.9, 720.725))
            ThreePointArc((723.9, 720.725), (726.145064, 719.795064), (727.075, 717.55))
            Line((727.075, 717.55), (727.075, 44.45))
            ThreePointArc((727.075, 44.45), (726.145064, 42.204936), (723.9, 41.275))
            Line((723.9, 41.275), (635, 41.275))
        make_face(mode=Mode.SUBTRACT)
        with BuildLine():
            ThreePointArc((-603.25, 152.4), (-607.740128, 150.540128), (-609.6, 146.05))
            Line((-609.6, 146.05), (-609.6, 38.1))
            ThreePointArc((-609.6, 38.1), (-607.740128, 33.609872), (-603.25, 31.75))
            Line((-603.25, 31.75), (603.25, 31.75))
            ThreePointArc((603.25, 31.75), (607.740128, 33.609872), (609.6, 38.1))
            Line((609.6, 38.1), (609.6, 146.05))
            ThreePointArc((609.6, 146.05), (607.740128, 150.540128), (603.25, 152.4))
            Line((603.25, 152.4), (-603.25, 152.4))
        make_face()
        with BuildLine():
            Line((-600.075, 44.45), (-600.075, 139.7))
            ThreePointArc((-600.075, 139.7), (-599.145064, 141.945064), (-596.9, 142.875))
            Line((-596.9, 142.875), (596.9, 142.875))
            ThreePointArc((596.9, 142.875), (599.145064, 141.945064), (600.075, 139.7))
            Line((600.075, 139.7), (600.075, 44.45))
            ThreePointArc((600.075, 44.45), (599.145064, 42.204936), (596.9, 41.275))
            Line((596.9, 41.275), (-596.9, 41.275))
            ThreePointArc((-596.9, 41.275), (-599.145064, 42.204936), (-600.075, 44.45))
        make_face(mode=Mode.SUBTRACT)
    extrude(amount=-F2_DEPTH, mode=Mode.SUBTRACT)


solid = f1.part
